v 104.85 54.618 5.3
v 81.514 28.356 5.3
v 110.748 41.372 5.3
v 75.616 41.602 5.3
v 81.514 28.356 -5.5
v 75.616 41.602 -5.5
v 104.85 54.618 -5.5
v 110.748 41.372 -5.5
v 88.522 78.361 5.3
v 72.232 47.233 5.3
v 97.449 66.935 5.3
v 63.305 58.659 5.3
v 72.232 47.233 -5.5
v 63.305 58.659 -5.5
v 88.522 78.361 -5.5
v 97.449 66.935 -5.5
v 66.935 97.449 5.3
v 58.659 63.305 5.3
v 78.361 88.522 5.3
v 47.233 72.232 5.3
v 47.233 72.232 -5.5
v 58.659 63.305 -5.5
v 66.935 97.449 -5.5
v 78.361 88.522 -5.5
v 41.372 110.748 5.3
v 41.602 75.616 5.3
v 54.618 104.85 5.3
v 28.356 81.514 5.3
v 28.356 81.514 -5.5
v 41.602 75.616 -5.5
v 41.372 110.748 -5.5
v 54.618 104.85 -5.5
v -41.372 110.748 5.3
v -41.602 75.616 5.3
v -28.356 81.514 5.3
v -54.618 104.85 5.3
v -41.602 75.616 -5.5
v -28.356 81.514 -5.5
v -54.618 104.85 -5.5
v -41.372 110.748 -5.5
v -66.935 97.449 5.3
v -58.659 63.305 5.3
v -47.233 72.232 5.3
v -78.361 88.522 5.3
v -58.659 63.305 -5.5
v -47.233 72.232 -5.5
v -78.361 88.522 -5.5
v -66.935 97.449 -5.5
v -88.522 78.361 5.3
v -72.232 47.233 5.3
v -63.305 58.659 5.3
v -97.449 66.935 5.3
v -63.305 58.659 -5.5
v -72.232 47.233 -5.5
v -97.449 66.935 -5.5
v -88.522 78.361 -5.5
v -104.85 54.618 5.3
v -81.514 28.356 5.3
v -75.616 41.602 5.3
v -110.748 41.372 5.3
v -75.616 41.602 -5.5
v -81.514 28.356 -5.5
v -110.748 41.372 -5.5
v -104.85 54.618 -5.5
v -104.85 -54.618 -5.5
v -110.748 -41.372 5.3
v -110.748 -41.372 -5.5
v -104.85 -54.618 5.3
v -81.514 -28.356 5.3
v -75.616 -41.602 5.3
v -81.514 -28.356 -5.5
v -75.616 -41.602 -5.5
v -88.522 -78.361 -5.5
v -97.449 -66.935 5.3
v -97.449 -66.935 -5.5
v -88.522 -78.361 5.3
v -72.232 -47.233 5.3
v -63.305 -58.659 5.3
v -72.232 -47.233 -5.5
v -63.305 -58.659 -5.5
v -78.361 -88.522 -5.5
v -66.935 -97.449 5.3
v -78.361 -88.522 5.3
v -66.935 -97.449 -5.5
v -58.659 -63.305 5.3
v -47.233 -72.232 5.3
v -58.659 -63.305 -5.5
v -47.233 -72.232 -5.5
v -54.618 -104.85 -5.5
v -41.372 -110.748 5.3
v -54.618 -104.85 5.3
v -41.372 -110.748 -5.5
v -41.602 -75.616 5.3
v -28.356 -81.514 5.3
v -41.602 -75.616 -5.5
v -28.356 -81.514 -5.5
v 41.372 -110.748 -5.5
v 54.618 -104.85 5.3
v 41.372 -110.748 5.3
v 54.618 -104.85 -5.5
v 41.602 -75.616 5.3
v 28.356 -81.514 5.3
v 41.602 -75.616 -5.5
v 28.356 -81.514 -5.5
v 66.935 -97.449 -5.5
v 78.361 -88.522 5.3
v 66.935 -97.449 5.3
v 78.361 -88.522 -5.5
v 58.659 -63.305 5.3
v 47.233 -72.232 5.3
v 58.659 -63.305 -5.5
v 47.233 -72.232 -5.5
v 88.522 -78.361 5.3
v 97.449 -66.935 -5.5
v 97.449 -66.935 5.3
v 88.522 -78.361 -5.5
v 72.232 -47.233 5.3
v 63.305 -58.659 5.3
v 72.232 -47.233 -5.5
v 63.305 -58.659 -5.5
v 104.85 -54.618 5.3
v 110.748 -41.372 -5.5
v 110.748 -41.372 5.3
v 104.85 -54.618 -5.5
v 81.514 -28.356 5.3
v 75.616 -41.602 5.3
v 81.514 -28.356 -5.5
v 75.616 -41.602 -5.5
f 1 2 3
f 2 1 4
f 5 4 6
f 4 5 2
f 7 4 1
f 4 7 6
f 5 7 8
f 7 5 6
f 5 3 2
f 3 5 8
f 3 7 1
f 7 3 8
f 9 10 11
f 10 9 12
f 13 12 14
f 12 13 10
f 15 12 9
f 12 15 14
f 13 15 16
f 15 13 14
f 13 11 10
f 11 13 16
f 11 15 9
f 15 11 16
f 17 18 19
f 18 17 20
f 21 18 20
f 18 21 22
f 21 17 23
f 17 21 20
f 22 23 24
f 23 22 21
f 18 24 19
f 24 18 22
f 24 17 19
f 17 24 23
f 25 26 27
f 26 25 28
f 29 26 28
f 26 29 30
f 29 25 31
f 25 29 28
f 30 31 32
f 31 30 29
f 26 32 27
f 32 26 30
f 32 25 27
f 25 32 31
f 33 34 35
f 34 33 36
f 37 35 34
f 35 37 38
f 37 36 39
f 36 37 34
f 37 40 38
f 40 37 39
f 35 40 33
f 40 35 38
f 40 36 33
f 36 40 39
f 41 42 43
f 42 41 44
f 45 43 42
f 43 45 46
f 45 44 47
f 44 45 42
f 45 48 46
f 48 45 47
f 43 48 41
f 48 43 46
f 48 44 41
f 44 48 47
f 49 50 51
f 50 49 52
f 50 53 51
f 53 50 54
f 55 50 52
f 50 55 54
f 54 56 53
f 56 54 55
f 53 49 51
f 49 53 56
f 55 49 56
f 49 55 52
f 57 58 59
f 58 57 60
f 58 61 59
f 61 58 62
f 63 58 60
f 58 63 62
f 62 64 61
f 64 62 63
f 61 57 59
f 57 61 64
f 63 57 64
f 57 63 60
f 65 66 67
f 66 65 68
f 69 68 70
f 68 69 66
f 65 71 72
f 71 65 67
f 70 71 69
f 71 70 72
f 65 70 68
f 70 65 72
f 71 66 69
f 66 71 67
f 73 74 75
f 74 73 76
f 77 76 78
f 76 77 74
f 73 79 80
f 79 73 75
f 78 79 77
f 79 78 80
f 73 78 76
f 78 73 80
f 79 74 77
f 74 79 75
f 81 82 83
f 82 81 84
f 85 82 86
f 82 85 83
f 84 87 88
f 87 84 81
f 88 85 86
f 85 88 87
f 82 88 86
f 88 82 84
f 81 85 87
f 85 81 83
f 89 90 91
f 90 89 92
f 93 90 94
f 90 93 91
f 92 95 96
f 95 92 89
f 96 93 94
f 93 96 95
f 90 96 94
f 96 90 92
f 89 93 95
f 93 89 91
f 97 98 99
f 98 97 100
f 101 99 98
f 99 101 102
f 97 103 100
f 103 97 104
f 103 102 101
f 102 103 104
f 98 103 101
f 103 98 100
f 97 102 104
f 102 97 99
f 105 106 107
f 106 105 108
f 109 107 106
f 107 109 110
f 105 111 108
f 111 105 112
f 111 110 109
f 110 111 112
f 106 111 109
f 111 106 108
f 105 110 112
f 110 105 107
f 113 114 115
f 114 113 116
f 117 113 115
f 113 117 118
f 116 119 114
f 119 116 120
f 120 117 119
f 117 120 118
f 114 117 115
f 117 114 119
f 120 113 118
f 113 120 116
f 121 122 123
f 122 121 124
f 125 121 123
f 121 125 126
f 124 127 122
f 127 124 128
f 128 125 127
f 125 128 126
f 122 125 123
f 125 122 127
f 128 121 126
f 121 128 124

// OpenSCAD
// ============================================================================
// Atom Lithography Machine — Parametric OpenSCAD Module (S3.2-01)
// ============================================================================
// part_id           : S3.2-01
// parent_bom_id     : S3.2
// subsystem         : S3
// part_name         : 100 K soguk-ada 8-kanalli ultra-dusuk-C LTC6268 CSA modulleri (Exp127 kilitli)
// material          : OFHC Cu
// temp_stage        : 100 K (soguk ada)
// vacuum_grade      : UHV 1e-9 mbar
// tolerance         : ±5% kazanc
// computed_mass_kg  : 0.47602
// envelope_mm       : 266.873 x 266.873 x 13.982
// design_maturity   : M0_M1_DETAILED_CAD_DESIGN_ONLY
// no_lab_measurement: true
// iec61508_certified: false
// semi_s2_certified : false
// Units: millimeters (mm)
// ============================================================================

$fn = 64;

// Nominal bounding envelope parameters (mm)
bbox_x = 266.8727;
bbox_y = 266.8727;
bbox_z = 13.9817;

// Part-specific parametric dimensions
n_csa_modules = 16;
channels_total = 128;
module_r_in_mm = 86.0;
module_r_out_mm = 118.0;
bus_r_out_mm = 142.0;
operating_temp_k = 100.0;

// Interface / port parameters (mm)
port_csa_16x_coax_in_bore = 172.000;
port_cold_island_100k_bus_od = 284.000;
port_cold_island_100k_bus_bore = 268.000;

module part_S3_2_01() {
  union() {
    // 100 K Cold-Island 8-ch LTC6268 CSA Module #1 (24 deg)
    translate([93.182, 41.487, -0.100]) rotate([0.000, 0.000, 24.000]) cube([32.000, 14.500, 10.800], center=true);
    // 100 K Cold-Island 8-ch LTC6268 CSA Module #2 (38 deg)
    translate([80.377, 62.797, -0.100]) rotate([0.000, 0.000, 38.000]) cube([32.000, 14.500, 10.800], center=true);
    // 100 K Cold-Island 8-ch LTC6268 CSA Module #3 (52 deg)
    translate([62.797, 80.377, -0.100]) rotate([0.000, 0.000, 52.000]) cube([32.000, 14.500, 10.800], center=true);
    // 100 K Cold-Island 8-ch LTC6268 CSA Module #4 (66 deg)
    translate([41.487, 93.182, -0.100]) rotate([0.000, 0.000, 66.000]) cube([32.000, 14.500, 10.800], center=true);
    // 100 K Cold-Island 8-ch LTC6268 CSA Module #5 (114 deg)
    translate([-41.487, 93.182, -0.100]) rotate([0.000, 0.000, 114.000]) cube([32.000, 14.500, 10.800], center=true);
    // 100 K Cold-Island 8-ch LTC6268 CSA Module #6 (128 deg)
    translate([-62.797, 80.377, -0.100]) rotate([0.000, 0.000, 128.000]) cube([32.000, 14.500, 10.800], center=true);
    // 100 K Cold-Island 8-ch LTC6268 CSA Module #7 (142 deg)
    translate([-80.377, 62.797, -0.100]) rotate([0.000, 0.000, 142.000]) cube([32.000, 14.500, 10.800], center=true);
    // 100 K Cold-Island 8-ch LTC6268 CSA Module #8 (156 deg)
    translate([-93.182, 41.487, -0.100]) rotate([0.000, 0.000, 156.000]) cube([32.000, 14.500, 10.800], center=true);
    // 100 K Cold-Island 8-ch LTC6268 CSA Module #9 (204 deg)
    translate([-93.182, -41.487, -0.100]) rotate([0.000, 0.000, 204.000]) cube([32.000, 14.500, 10.800], center=true);
    // 100 K Cold-Island 8-ch LTC6268 CSA Module #10 (218 deg)
    translate([-80.377, -62.797, -0.100]) rotate([0.000, 0.000, 218.000]) cube([32.000, 14.500, 10.800], center=true);
    // 100 K Cold-Island 8-ch LTC6268 CSA Module #11 (232 deg)
    translate([-62.797, -80.377, -0.100]) rotate([0.000, 0.000, 232.000]) cube([32.000, 14.500, 10.800], center=true);
    // 100 K Cold-Island 8-ch LTC6268 CSA Module #12 (246 deg)
    translate([-41.487, -93.182, -0.100]) rotate([0.000, 0.000, 246.000]) cube([32.000, 14.500, 10.800], center=true);
    // 100 K Cold-Island 8-ch LTC6268 CSA Module #13 (294 deg)
    translate([41.487, -93.182, -0.100]) rotate([0.000, 0.000, 294.000]) cube([32.000, 14.500, 10.800], center=true);
    // 100 K Cold-Island 8-ch LTC6268 CSA Module #14 (308 deg)
    translate([62.797, -80.377, -0.100]) rotate([0.000, 0.000, 308.000]) cube([32.000, 14.500, 10.800], center=true);
    // 100 K Cold-Island 8-ch LTC6268 CSA Module #15 (322 deg)
    translate([80.377, -62.797, -0.100]) rotate([0.000, 0.000, 322.000]) cube([32.000, 14.500, 10.800], center=true);
    // 100 K Cold-Island 8-ch LTC6268 CSA Module #16 (336 deg)
    translate([93.182, -41.487, -0.100]) rotate([0.000, 0.000, 336.000]) cube([32.000, 14.500, 10.800], center=true);
  }
}

// World assembly mounting transform (global machine frame, mm / deg):
// translate([0.000, 0.000, -8.500]) rotate([0.000, 0.000, 0.000]) part_S3_2_01();

part_S3_2_01();
